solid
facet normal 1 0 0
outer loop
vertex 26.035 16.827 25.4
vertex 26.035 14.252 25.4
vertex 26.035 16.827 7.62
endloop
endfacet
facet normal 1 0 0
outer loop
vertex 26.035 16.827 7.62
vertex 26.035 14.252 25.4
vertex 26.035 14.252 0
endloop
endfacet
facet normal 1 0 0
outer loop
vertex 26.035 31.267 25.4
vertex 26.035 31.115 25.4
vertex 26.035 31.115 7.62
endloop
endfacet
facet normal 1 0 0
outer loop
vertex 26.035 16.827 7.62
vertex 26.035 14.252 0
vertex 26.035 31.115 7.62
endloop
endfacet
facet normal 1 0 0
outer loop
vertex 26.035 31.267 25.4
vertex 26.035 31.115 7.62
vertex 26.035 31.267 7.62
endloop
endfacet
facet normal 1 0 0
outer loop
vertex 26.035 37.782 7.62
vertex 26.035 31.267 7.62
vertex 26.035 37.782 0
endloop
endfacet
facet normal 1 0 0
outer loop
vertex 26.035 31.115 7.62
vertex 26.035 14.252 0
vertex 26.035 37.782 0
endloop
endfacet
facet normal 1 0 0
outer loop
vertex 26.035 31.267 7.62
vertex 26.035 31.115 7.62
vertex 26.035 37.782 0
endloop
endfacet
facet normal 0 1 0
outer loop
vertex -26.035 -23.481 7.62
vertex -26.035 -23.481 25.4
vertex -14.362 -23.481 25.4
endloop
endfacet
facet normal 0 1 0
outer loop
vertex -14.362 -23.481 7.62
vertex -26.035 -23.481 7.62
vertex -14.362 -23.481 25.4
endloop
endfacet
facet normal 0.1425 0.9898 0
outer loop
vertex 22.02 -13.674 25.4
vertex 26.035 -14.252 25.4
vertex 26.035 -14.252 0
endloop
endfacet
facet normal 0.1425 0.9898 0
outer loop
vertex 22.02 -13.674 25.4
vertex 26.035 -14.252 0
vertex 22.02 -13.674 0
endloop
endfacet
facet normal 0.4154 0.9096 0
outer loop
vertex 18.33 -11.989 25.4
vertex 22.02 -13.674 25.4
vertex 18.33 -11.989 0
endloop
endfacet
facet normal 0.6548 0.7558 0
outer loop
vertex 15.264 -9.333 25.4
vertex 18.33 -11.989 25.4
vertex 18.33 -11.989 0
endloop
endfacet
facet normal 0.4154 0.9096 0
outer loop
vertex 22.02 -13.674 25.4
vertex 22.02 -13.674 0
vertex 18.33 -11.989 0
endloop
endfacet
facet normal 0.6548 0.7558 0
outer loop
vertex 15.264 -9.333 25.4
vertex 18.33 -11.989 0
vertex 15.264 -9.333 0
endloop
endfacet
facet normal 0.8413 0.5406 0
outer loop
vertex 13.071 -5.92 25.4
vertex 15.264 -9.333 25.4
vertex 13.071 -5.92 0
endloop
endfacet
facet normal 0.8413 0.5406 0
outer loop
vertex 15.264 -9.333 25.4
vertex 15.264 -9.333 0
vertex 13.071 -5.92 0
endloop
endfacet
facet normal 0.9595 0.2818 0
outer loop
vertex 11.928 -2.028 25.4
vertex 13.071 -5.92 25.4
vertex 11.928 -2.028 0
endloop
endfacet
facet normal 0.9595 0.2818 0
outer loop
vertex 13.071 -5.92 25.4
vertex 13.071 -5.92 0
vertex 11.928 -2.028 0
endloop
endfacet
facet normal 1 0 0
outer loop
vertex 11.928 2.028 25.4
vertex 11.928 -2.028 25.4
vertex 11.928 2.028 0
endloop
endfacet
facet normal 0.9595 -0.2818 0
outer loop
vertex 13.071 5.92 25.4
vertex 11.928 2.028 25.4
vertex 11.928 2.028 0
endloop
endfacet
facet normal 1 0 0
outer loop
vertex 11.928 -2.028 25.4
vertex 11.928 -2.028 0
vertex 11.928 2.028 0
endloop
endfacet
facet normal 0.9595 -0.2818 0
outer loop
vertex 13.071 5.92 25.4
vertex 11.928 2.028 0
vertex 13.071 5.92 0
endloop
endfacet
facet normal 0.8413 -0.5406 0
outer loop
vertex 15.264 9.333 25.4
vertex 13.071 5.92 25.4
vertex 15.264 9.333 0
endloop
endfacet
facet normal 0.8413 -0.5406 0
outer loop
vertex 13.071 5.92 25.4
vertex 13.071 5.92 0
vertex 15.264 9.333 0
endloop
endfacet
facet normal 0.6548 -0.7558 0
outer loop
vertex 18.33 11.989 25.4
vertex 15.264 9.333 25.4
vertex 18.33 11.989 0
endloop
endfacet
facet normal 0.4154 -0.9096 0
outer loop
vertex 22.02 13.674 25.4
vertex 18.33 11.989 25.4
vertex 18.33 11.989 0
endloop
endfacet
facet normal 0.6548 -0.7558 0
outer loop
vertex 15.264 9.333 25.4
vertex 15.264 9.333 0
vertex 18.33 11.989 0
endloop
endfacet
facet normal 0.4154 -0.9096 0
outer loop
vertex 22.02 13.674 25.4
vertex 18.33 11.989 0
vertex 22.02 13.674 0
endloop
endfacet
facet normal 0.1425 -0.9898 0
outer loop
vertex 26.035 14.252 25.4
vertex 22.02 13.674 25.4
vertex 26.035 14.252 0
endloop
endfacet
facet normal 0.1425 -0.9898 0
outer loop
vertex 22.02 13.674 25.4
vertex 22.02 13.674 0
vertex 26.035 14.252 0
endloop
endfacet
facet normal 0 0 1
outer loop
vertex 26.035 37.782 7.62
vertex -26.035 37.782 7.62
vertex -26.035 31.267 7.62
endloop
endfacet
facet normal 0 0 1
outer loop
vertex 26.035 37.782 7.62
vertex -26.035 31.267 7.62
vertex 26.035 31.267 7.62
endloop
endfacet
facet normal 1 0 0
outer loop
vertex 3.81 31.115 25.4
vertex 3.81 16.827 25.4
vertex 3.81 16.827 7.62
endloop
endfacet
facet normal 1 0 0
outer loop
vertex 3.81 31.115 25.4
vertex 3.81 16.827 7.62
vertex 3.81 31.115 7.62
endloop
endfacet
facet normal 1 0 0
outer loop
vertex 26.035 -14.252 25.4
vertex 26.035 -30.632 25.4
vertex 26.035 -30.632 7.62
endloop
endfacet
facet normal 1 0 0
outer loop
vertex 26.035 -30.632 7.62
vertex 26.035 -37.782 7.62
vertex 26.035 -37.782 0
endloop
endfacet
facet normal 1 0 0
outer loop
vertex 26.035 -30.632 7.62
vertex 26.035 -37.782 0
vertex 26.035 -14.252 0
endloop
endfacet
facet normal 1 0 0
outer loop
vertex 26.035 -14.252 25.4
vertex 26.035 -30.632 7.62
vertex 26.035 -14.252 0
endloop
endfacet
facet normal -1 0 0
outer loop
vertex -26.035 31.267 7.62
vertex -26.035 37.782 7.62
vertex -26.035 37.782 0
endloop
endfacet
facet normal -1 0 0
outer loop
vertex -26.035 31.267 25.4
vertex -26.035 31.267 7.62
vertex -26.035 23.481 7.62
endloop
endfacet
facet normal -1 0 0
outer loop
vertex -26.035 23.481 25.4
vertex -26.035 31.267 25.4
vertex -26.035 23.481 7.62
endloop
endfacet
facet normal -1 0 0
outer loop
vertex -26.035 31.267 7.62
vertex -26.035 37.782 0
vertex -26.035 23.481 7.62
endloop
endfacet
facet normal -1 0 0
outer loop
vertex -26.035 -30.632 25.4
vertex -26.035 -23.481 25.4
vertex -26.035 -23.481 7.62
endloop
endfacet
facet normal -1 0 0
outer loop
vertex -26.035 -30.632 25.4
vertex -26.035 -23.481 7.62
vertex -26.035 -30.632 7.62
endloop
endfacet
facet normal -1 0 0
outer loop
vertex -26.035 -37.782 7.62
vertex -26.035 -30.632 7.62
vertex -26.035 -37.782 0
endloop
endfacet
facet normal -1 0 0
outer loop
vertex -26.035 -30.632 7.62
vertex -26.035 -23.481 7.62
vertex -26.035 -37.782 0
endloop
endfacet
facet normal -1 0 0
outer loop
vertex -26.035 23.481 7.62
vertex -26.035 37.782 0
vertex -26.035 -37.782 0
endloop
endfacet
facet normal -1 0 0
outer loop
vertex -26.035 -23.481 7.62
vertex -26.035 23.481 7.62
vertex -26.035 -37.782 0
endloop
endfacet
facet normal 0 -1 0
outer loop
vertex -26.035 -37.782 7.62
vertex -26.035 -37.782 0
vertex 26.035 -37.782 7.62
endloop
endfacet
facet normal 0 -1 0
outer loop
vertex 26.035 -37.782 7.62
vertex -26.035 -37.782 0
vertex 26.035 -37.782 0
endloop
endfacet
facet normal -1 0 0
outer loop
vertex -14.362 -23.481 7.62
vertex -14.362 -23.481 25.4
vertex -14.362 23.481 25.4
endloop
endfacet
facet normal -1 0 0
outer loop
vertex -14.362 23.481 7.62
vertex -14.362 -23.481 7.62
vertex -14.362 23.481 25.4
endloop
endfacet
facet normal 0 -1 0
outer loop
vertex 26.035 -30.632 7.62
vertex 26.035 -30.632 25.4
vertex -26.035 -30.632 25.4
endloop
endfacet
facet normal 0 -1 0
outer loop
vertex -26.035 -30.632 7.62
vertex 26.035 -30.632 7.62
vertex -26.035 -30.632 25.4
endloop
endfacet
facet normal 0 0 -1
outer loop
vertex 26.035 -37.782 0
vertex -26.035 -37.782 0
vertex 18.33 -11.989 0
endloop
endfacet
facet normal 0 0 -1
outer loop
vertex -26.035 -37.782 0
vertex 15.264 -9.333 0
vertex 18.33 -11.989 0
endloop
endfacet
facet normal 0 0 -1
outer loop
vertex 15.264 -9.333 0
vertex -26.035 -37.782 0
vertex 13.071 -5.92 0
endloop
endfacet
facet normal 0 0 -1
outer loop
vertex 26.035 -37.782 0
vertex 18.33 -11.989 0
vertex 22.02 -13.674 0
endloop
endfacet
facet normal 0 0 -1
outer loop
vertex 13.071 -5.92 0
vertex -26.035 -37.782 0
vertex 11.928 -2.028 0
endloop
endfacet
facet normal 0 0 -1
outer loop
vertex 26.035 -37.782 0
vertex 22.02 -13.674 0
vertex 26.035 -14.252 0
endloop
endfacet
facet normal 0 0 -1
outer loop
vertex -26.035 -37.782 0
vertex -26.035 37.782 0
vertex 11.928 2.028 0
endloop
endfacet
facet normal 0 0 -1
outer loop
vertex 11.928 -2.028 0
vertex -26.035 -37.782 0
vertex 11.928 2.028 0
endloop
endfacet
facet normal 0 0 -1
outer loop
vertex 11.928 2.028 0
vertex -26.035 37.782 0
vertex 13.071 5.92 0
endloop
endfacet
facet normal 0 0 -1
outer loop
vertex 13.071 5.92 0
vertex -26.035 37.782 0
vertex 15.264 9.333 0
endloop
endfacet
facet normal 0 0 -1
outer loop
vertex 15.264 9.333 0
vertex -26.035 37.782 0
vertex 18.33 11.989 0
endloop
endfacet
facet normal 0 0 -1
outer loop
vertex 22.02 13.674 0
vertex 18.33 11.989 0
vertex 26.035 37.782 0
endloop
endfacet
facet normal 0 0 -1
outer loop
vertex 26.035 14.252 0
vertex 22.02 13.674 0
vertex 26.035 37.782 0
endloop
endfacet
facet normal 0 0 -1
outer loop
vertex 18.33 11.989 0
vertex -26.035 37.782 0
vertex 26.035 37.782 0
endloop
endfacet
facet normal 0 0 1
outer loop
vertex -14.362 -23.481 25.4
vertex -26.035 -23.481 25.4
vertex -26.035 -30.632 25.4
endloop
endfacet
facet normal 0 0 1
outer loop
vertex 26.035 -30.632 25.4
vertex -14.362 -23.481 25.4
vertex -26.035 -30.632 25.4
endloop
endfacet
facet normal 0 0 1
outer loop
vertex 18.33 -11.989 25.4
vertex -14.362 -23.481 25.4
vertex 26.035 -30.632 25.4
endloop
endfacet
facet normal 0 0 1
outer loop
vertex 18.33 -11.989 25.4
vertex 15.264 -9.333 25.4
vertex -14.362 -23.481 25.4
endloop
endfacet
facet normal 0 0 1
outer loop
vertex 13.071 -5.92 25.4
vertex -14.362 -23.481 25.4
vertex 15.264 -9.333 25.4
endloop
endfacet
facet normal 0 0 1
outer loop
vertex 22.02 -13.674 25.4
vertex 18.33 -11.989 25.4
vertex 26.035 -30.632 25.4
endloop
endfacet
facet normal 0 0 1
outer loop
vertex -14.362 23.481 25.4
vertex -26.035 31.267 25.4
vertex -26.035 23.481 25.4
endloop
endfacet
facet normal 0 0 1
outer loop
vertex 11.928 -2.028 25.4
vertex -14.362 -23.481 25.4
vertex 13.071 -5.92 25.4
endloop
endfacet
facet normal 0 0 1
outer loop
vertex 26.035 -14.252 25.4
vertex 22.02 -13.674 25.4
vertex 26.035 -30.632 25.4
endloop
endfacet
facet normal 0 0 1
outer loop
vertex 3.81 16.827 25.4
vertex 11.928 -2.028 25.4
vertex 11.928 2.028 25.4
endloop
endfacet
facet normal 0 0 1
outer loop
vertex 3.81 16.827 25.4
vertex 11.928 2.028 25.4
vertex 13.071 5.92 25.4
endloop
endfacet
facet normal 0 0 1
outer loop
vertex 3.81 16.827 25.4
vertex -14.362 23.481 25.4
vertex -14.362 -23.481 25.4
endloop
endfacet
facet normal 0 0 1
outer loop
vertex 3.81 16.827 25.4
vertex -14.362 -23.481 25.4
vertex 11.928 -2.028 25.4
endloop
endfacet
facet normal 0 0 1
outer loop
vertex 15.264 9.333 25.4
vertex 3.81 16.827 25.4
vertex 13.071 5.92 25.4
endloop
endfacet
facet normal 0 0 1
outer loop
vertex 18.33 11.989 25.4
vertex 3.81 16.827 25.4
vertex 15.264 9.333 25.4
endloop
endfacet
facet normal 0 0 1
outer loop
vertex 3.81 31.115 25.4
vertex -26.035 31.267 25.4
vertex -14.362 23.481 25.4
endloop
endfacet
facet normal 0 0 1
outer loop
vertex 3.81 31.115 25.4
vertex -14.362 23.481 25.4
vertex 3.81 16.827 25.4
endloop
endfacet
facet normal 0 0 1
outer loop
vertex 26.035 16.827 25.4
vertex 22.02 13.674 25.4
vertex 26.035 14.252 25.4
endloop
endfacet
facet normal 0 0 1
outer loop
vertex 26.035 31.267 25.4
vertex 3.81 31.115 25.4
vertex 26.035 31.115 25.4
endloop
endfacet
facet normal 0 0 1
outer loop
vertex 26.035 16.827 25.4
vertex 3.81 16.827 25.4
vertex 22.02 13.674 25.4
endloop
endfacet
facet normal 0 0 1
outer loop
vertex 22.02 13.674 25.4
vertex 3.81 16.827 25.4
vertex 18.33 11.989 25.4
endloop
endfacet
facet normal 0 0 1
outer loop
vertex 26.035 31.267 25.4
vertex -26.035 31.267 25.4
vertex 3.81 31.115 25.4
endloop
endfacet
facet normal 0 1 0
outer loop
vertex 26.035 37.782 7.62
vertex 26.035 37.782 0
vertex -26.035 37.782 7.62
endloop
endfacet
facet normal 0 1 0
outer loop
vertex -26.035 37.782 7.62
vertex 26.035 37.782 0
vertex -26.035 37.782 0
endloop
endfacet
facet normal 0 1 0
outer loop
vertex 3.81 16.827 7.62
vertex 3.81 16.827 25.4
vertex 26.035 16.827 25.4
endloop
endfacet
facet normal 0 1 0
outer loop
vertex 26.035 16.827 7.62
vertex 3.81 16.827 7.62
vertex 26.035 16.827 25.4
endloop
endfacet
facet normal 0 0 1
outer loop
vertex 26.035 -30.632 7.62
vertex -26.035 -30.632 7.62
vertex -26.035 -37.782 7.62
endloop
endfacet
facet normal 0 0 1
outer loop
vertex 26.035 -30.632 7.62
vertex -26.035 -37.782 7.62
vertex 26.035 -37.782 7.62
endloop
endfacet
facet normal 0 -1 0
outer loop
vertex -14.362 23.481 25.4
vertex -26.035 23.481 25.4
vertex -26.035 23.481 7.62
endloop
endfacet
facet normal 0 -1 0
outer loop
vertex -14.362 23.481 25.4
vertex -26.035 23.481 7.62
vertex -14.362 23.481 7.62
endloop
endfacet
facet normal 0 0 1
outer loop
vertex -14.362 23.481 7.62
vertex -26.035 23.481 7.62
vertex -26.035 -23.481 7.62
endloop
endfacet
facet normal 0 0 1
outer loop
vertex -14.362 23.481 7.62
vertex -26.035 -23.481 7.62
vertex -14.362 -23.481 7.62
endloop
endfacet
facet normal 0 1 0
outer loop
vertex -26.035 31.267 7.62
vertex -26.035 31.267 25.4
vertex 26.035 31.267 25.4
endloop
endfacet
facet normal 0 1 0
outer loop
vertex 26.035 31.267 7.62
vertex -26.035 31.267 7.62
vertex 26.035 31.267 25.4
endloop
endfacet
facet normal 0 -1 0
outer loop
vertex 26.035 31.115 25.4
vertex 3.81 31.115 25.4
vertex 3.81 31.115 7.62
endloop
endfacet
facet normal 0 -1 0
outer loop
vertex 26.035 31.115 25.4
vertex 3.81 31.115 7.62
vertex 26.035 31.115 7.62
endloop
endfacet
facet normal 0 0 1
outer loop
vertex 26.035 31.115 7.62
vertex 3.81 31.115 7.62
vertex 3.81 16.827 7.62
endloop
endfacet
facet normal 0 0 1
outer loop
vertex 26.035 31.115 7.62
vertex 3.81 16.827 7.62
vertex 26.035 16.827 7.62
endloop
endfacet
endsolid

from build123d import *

# Parameters (mm, degrees)
F1_DEPTH = 25.4
F2_W     = 23.3461521566
F2_H     = 46.9620153308
F3_DEPTH = 17.78
F4_W     = 25.4
F4_H     = 7.1507450193
F4_W_2   = 26.6700030029
F5_DEPTH = 17.78
F4_H_2   = 6.5157404274
F6_DEPTH = 17.78
F7_W     = 22.2250013612
F7_H     = 14.2875015736
F8_DEPTH = 17.78


with BuildPart() as f1:
    # F0 (on Top) → F1 (new body)
    with BuildSketch(Plane.XY):
        with BuildLine():
            Line((26.0350015014, 37.782497704), (-26.0350015014, 37.782497704))
            Line((-26.0350015014, 37.782497704), (-26.0350015014, -37.782497704))
            Line((-26.0350015014, -37.782497704), (26.0350015014, -37.782497704))
            Line((26.0350015014, -37.782497704), (26.0350015014, -14.2516041014))
            ThreePointArc((26.0350015014, -14.2516041014), (11.7833974, 0), (26.0350015014, 14.2516041014))
            Line((26.0350015014, 14.2516041014), (26.0350015014, 37.782497704))
        make_face()
    extrude(amount=F1_DEPTH)

    # F2 (on face) → F3 (cut)
    with BuildSketch(Plane.XY.offset(25.4)):
        with Locations((-26.0350015014, 0)):
            Rectangle(F2_W, F2_H)
    extrude(amount=-F3_DEPTH, mode=Mode.SUBTRACT)

    # F4 (on face) → F5 (cut)
    with BuildSketch(Plane.XY.offset(25.4)):
        with Locations((-13.3350015014, -34.2071251944)):
            Rectangle(F4_W, F4_H)
        with Locations((12.7, -34.2071251944)):
            Rectangle(F4_W_2, F4_H)
    extrude(amount=-F5_DEPTH, mode=Mode.SUBTRACT)

    # F4 (on face) → F6 (cut)
    with BuildSketch(Plane.XY.offset(25.4)):
        with Locations((12.7, 34.5246274903)):
            Rectangle(F4_W_2, F4_H_2)
        with Locations((-13.3350015014, 34.5246274903)):
            Rectangle(F4_W, F4_H_2)
    extrude(amount=-F6_DEPTH, mode=Mode.SUBTRACT)

    # F7 (on face) → F8 (cut)
    with BuildSketch(Plane.XY.offset(25.4)):
        with Locations((14.9225008208, 23.9712502807)):
            Rectangle(F7_W, F7_H)
    extrude(amount=-F8_DEPTH, mode=Mode.SUBTRACT)


solid = f1.part
